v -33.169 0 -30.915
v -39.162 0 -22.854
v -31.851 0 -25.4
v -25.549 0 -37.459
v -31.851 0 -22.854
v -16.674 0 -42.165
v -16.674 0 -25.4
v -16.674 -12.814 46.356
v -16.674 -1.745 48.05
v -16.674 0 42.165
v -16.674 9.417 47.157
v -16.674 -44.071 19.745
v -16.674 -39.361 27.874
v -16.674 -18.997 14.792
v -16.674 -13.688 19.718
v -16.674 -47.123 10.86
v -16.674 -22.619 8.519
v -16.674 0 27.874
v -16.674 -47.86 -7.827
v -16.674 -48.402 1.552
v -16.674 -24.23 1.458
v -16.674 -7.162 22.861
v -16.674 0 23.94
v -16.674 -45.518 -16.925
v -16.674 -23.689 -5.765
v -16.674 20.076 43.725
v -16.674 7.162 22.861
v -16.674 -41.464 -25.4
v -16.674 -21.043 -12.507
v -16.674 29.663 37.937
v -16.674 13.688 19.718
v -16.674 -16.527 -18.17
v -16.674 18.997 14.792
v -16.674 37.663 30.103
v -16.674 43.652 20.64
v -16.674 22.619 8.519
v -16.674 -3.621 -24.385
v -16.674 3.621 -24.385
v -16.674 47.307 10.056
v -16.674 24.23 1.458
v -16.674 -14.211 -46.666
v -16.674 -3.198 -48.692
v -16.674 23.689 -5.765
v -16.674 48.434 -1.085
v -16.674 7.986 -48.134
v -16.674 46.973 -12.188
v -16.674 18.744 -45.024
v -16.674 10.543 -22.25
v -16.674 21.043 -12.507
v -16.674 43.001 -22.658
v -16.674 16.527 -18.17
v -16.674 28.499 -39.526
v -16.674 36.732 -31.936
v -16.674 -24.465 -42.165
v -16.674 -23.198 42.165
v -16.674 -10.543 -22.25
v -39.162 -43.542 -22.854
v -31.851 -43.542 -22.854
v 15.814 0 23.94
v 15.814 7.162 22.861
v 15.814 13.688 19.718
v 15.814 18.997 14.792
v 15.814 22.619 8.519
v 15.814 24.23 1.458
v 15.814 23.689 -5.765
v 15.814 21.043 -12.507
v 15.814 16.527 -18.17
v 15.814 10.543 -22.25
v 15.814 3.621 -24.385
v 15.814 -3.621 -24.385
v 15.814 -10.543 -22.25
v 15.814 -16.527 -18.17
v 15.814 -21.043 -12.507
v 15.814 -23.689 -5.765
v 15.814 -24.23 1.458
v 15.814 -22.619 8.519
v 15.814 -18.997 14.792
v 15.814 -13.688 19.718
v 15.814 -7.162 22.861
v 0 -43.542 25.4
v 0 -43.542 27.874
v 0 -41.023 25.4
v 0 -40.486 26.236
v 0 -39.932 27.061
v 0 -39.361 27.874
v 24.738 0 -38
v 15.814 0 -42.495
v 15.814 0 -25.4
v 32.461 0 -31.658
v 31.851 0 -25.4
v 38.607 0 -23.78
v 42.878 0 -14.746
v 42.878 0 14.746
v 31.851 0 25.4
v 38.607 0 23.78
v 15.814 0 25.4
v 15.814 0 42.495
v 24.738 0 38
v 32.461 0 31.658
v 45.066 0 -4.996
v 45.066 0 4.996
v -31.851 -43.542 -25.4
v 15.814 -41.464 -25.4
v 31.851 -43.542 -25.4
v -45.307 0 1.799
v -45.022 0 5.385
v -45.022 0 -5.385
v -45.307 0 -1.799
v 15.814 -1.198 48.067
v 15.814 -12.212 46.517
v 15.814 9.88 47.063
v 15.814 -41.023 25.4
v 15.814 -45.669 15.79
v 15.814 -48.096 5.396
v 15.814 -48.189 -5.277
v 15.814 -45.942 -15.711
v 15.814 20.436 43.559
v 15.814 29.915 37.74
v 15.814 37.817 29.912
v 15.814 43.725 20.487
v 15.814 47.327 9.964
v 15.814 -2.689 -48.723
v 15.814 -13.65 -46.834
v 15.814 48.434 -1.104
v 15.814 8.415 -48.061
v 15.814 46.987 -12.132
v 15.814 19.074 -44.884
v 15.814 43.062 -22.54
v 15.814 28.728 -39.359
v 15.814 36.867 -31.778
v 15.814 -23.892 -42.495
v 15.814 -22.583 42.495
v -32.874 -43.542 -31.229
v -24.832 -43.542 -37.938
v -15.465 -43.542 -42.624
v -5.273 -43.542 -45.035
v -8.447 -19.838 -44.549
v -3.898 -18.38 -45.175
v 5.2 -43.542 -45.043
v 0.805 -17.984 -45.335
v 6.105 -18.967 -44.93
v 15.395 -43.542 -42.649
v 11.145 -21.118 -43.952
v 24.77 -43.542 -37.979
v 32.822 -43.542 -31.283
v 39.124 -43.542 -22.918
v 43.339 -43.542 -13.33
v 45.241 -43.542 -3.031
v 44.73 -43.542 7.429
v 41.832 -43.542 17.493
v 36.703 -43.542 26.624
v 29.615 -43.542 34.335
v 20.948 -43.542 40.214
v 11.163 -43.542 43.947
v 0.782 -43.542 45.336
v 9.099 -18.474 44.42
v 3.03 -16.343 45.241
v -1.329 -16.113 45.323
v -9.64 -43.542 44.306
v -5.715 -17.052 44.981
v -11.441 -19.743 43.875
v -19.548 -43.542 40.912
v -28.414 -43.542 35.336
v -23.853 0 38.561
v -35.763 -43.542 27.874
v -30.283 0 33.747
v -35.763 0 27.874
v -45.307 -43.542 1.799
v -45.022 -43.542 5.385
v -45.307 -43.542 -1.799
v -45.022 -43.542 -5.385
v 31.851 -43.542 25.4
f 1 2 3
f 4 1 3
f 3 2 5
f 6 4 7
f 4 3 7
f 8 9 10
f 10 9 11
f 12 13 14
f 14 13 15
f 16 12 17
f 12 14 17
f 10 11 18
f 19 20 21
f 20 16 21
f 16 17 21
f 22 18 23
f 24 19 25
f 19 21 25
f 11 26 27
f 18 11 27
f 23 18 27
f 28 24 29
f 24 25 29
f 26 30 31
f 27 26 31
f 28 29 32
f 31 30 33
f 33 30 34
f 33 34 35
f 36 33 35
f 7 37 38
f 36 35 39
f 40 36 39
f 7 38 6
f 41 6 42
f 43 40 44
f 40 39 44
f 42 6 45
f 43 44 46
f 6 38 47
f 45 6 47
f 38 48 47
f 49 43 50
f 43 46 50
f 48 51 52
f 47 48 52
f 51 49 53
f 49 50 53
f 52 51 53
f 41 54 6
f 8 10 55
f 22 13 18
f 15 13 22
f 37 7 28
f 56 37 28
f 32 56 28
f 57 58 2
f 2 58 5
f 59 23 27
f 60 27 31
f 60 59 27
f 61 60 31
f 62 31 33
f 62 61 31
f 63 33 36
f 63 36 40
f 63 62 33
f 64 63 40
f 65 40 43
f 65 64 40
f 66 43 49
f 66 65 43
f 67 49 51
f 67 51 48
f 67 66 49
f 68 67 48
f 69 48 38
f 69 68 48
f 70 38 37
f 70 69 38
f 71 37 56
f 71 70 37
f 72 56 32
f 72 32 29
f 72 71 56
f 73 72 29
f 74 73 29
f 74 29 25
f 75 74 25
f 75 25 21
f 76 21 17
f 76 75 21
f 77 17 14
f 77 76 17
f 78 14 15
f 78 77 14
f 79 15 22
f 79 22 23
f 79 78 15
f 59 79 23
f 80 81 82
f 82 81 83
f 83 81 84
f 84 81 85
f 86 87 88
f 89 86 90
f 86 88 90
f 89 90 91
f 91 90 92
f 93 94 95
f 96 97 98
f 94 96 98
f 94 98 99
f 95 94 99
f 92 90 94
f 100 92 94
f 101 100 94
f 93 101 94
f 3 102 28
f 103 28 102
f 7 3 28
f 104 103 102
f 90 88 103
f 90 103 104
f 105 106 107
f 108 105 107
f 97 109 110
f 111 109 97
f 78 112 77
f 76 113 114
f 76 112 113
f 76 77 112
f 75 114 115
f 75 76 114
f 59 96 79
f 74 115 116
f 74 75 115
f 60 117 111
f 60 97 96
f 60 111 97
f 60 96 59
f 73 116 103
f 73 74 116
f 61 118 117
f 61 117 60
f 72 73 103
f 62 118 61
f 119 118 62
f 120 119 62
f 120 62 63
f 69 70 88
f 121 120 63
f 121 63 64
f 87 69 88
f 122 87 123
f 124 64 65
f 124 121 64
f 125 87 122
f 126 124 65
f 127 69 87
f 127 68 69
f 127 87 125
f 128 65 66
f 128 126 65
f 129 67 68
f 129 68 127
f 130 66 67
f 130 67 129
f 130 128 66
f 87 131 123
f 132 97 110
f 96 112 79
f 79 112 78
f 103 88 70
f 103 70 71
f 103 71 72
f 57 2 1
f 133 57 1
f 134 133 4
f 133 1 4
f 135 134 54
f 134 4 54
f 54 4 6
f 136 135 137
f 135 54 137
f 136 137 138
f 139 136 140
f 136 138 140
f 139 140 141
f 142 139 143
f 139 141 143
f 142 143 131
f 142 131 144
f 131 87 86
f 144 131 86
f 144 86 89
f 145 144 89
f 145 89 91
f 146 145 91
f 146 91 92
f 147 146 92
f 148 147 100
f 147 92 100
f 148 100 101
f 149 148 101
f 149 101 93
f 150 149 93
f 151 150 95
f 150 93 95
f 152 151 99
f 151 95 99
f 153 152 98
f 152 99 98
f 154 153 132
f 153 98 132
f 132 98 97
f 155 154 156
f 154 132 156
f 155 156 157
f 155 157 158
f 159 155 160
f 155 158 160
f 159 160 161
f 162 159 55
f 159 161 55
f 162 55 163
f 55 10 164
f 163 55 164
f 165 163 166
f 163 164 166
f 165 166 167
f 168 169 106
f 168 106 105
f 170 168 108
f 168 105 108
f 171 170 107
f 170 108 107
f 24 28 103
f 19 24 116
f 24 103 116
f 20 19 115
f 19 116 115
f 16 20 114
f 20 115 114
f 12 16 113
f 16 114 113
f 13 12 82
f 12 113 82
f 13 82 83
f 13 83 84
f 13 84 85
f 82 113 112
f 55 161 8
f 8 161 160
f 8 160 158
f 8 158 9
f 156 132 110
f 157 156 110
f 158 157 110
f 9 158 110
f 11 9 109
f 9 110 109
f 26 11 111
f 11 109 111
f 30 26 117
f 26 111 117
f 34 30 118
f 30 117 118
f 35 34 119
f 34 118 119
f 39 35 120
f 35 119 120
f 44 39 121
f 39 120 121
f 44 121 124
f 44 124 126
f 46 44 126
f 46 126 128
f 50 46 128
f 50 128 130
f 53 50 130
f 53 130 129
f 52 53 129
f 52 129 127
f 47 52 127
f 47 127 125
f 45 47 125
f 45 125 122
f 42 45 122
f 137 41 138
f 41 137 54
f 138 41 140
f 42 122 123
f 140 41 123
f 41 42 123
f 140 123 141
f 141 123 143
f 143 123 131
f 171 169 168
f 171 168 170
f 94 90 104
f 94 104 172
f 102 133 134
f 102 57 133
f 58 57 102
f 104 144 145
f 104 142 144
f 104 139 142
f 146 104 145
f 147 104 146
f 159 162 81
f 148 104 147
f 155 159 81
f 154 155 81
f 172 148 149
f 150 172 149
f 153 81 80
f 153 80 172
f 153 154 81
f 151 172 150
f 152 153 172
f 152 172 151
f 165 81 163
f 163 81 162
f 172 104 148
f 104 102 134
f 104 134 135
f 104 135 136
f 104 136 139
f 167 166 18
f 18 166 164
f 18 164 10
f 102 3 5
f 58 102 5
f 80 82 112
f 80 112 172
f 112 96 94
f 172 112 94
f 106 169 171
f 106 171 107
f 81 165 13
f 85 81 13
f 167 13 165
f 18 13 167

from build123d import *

# Parameters (mm, degrees)
F0_R     = 45.342511
F0_W     = 63.701598
F0_H     = 50.8
F1_DEPTH = 43.541595
F2_W     = 74.988289
F2_H     = 50.727981
F3_DEPTH = 45.021635
F4_W     = 32.488421
F4_H     = 24.141245


with BuildPart() as f1:
    # F0 (on Front) → F1 (new body)
    with BuildSketch(Plane.XZ):
        Circle(F0_R)
        Rectangle(F0_W, F0_H, mode=Mode.SUBTRACT)
    extrude(amount=F1_DEPTH)

    # F2 (on Right) → F3 (cut)
    with BuildSketch(Plane.YZ):
        with Locations((-19.281947, 2.510205)):
            Rectangle(F2_W, F2_H)
    extrude(amount=-F3_DEPTH, mode=Mode.SUBTRACT)

    # F4 (on Front) → F5 (revolve)
    with BuildSketch(Plane.XZ):
        with Locations((-0.430005, 36.010887)):
            Rectangle(F4_W, F4_H)
    revolve(axis=Axis((39.093187, 0, -0.357915), (-1, 0, 0)))


solid = f1.part
